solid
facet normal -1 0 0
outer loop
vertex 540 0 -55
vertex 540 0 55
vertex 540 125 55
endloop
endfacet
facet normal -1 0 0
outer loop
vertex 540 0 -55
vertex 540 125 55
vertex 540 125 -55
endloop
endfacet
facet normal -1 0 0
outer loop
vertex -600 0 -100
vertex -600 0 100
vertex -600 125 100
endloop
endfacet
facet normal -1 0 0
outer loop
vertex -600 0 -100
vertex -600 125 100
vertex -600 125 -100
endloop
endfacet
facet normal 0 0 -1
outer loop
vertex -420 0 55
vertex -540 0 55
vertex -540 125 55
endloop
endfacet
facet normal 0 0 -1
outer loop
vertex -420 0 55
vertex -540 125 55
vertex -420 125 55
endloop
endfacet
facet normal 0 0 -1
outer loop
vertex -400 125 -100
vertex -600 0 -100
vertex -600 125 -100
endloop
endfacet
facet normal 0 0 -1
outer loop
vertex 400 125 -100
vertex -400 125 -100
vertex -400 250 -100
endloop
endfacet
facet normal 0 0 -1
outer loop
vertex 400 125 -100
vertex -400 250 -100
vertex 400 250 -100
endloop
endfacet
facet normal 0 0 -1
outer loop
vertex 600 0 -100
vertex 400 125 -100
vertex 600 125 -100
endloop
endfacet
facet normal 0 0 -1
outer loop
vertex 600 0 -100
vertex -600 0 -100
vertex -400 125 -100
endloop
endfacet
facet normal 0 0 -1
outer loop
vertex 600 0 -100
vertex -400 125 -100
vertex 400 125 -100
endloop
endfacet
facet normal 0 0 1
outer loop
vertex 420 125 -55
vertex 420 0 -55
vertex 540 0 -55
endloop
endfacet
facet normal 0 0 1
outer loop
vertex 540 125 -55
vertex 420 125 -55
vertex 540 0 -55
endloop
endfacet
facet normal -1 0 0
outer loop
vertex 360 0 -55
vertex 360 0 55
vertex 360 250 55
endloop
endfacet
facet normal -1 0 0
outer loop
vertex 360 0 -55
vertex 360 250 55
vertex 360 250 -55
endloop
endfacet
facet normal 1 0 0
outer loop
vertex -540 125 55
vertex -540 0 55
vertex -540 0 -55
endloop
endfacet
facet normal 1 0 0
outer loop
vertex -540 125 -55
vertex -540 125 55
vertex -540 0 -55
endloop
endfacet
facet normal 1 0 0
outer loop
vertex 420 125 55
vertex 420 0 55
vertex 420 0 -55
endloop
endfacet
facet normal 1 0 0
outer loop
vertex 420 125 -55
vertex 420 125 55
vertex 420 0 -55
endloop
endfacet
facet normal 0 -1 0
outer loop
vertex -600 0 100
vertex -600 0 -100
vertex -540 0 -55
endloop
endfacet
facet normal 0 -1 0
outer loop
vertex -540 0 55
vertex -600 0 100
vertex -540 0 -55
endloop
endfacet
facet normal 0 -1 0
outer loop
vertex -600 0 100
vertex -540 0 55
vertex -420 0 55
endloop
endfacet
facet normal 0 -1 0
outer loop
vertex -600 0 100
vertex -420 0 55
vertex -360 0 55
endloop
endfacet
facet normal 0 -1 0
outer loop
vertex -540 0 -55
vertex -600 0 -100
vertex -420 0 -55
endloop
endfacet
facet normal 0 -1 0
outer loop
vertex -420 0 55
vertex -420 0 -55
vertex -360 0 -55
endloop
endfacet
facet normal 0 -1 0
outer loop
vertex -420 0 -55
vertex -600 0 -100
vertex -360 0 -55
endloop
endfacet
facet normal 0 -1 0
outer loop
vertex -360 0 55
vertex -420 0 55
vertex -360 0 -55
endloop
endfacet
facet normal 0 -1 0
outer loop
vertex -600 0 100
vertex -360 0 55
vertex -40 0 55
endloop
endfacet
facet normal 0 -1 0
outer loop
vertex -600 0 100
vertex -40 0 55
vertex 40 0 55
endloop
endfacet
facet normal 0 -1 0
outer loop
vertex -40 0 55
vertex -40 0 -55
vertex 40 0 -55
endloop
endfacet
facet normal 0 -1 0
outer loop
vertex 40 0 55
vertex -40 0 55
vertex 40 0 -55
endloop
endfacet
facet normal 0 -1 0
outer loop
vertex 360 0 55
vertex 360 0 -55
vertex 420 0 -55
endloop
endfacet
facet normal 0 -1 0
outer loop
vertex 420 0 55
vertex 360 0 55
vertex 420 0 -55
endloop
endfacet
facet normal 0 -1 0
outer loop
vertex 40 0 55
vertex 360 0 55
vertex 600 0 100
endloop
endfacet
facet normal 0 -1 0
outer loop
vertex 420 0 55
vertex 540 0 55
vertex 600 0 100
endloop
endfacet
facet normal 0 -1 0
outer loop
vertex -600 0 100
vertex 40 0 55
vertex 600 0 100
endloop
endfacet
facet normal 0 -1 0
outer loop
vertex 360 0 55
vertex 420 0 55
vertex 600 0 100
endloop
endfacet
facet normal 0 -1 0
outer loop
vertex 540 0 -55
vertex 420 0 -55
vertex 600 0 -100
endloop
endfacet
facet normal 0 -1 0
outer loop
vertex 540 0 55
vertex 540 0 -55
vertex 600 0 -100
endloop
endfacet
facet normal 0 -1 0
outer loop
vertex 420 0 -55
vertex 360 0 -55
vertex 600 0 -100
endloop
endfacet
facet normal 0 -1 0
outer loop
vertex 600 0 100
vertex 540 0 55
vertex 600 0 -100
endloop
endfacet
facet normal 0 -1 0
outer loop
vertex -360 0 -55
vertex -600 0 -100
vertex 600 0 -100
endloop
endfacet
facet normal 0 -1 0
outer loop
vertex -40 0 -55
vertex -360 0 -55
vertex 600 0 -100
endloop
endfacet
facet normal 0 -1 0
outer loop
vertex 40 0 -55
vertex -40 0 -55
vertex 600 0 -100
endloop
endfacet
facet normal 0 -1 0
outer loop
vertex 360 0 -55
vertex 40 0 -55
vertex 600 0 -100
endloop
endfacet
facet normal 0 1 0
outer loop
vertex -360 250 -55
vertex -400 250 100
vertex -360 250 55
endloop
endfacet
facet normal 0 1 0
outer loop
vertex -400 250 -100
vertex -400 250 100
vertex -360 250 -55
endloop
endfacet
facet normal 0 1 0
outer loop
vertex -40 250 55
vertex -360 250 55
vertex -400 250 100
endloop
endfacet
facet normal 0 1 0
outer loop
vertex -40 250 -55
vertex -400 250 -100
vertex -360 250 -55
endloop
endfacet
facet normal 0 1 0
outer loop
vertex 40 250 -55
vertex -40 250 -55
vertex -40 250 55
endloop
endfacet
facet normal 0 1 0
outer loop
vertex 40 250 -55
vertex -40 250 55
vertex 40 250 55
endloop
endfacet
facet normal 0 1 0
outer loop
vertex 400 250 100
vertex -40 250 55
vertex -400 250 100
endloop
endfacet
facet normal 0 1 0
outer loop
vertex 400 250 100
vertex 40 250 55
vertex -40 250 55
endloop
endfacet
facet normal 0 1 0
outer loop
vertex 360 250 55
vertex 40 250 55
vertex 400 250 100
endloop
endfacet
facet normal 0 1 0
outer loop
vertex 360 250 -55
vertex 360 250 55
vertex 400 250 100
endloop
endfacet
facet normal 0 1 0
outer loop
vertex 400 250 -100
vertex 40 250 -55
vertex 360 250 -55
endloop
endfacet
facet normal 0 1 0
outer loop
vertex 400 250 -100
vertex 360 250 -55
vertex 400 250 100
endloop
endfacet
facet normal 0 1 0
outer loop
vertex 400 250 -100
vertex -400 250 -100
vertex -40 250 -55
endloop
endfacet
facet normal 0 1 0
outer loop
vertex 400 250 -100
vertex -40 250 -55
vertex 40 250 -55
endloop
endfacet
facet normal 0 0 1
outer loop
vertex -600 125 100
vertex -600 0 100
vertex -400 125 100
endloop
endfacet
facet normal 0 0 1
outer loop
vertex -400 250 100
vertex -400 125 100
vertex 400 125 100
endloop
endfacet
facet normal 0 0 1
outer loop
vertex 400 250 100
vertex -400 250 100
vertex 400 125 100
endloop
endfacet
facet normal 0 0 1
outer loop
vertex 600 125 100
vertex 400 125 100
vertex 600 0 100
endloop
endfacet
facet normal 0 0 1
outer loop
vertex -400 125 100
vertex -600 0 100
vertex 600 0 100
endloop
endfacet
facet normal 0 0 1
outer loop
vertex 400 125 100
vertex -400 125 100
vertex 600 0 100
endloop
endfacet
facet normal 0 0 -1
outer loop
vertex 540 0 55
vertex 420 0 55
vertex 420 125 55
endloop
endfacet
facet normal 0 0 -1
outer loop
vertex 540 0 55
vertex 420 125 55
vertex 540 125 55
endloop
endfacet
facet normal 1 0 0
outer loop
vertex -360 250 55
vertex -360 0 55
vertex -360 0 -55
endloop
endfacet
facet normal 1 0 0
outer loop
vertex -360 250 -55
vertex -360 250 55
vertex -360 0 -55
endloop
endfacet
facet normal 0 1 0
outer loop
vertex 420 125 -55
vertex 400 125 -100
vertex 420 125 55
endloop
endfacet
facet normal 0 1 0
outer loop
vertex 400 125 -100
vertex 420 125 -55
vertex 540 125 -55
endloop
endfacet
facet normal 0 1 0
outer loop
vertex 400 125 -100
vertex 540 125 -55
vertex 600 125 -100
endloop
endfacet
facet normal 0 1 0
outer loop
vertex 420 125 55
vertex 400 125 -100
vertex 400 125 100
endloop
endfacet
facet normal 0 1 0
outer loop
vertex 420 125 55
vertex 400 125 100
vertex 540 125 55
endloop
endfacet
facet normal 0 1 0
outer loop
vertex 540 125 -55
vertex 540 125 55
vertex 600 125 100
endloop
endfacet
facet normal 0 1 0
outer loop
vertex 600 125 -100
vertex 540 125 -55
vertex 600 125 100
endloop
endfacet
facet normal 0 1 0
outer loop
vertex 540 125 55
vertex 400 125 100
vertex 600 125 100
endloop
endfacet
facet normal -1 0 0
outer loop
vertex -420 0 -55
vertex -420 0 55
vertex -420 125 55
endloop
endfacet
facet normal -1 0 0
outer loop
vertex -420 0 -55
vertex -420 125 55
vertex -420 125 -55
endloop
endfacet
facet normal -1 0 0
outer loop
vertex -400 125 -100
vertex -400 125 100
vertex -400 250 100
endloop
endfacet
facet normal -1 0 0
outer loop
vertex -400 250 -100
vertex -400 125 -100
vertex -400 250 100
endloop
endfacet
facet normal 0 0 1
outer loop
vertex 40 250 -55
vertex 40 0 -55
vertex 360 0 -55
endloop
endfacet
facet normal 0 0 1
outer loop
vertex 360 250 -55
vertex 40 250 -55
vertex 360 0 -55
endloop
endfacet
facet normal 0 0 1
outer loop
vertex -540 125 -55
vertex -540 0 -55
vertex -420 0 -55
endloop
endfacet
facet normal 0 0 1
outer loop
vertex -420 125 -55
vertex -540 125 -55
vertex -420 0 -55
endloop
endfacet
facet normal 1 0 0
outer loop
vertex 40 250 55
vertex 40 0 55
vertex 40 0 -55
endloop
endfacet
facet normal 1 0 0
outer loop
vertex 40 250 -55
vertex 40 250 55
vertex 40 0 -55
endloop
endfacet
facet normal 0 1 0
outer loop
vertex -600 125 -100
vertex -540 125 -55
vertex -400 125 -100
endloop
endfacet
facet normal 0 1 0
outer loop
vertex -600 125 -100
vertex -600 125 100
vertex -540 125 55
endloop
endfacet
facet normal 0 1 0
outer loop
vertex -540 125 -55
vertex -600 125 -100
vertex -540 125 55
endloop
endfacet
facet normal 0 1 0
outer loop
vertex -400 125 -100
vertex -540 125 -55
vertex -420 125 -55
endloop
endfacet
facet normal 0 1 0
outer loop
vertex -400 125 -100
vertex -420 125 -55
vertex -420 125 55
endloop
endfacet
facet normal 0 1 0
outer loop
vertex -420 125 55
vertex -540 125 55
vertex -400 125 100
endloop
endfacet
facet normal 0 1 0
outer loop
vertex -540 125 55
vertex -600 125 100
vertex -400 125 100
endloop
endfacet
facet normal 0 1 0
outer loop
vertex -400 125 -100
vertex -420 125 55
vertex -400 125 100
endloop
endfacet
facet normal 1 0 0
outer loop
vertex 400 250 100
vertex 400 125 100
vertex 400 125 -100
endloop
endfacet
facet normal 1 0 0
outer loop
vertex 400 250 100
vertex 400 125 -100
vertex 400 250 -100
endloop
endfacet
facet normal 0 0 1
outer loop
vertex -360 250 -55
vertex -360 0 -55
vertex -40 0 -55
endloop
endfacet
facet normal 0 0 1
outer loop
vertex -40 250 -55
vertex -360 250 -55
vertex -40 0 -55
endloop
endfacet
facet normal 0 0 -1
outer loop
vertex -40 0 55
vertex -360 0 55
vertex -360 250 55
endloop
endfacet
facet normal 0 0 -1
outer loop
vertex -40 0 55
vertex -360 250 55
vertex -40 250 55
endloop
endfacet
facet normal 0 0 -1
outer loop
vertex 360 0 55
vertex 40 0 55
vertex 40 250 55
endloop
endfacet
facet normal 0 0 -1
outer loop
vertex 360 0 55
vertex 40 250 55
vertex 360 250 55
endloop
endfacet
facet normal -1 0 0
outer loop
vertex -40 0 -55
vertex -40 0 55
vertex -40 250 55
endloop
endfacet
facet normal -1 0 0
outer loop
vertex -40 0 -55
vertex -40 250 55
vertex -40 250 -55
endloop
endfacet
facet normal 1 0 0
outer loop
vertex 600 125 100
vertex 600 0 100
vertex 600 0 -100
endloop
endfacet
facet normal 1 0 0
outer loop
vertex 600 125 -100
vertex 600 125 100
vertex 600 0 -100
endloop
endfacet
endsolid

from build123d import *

# Parameters (mm, degrees)
SKETCH_1_W          = 1200
SKETCH_1_H          = 200
SKETCH_1_W_2        = 120
SKETCH_1_H_2        = 110
SKETCH_1_W_3        = 320
EXTRUDE_1_DEPTH     = 250
SKETCH_2_W          = 200
SKETCH_2_H          = 125
CUT_EXTRUDE_1_DEPTH = 201


with BuildPart() as part:
    # Эскиз1 → Бобышка-Вытянуть1 (new body)
    with BuildSketch(Plane(origin=(0, 0, 0), x_dir=(1, 0, 0), z_dir=(0, 1, 0))):
        Rectangle(SKETCH_1_W, SKETCH_1_H)
        with Locations((-480, 0)):
            Rectangle(SKETCH_1_W_2, SKETCH_1_H_2, mode=Mode.SUBTRACT)
        with Locations((-200, 0)):
            Rectangle(SKETCH_1_W_3, SKETCH_1_H_2, mode=Mode.SUBTRACT)
        with Locations((200, 0)):
            Rectangle(SKETCH_1_W_3, SKETCH_1_H_2, mode=Mode.SUBTRACT)
        with Locations((480, 0)):
            Rectangle(SKETCH_1_W_2, SKETCH_1_H_2, mode=Mode.SUBTRACT)
    extrude(amount=EXTRUDE_1_DEPTH)

    # Эскиз2 → Вырез-Вытянуть1 (cut, through all)
    with BuildSketch(Plane.XY.offset(100)):
        with Locations((-500, 187.5)):
            Rectangle(SKETCH_2_W, SKETCH_2_H)
        with Locations((500, 187.5)):
            Rectangle(SKETCH_2_W, SKETCH_2_H)
    extrude(amount=-CUT_EXTRUDE_1_DEPTH, mode=Mode.SUBTRACT)


solid = part.part
